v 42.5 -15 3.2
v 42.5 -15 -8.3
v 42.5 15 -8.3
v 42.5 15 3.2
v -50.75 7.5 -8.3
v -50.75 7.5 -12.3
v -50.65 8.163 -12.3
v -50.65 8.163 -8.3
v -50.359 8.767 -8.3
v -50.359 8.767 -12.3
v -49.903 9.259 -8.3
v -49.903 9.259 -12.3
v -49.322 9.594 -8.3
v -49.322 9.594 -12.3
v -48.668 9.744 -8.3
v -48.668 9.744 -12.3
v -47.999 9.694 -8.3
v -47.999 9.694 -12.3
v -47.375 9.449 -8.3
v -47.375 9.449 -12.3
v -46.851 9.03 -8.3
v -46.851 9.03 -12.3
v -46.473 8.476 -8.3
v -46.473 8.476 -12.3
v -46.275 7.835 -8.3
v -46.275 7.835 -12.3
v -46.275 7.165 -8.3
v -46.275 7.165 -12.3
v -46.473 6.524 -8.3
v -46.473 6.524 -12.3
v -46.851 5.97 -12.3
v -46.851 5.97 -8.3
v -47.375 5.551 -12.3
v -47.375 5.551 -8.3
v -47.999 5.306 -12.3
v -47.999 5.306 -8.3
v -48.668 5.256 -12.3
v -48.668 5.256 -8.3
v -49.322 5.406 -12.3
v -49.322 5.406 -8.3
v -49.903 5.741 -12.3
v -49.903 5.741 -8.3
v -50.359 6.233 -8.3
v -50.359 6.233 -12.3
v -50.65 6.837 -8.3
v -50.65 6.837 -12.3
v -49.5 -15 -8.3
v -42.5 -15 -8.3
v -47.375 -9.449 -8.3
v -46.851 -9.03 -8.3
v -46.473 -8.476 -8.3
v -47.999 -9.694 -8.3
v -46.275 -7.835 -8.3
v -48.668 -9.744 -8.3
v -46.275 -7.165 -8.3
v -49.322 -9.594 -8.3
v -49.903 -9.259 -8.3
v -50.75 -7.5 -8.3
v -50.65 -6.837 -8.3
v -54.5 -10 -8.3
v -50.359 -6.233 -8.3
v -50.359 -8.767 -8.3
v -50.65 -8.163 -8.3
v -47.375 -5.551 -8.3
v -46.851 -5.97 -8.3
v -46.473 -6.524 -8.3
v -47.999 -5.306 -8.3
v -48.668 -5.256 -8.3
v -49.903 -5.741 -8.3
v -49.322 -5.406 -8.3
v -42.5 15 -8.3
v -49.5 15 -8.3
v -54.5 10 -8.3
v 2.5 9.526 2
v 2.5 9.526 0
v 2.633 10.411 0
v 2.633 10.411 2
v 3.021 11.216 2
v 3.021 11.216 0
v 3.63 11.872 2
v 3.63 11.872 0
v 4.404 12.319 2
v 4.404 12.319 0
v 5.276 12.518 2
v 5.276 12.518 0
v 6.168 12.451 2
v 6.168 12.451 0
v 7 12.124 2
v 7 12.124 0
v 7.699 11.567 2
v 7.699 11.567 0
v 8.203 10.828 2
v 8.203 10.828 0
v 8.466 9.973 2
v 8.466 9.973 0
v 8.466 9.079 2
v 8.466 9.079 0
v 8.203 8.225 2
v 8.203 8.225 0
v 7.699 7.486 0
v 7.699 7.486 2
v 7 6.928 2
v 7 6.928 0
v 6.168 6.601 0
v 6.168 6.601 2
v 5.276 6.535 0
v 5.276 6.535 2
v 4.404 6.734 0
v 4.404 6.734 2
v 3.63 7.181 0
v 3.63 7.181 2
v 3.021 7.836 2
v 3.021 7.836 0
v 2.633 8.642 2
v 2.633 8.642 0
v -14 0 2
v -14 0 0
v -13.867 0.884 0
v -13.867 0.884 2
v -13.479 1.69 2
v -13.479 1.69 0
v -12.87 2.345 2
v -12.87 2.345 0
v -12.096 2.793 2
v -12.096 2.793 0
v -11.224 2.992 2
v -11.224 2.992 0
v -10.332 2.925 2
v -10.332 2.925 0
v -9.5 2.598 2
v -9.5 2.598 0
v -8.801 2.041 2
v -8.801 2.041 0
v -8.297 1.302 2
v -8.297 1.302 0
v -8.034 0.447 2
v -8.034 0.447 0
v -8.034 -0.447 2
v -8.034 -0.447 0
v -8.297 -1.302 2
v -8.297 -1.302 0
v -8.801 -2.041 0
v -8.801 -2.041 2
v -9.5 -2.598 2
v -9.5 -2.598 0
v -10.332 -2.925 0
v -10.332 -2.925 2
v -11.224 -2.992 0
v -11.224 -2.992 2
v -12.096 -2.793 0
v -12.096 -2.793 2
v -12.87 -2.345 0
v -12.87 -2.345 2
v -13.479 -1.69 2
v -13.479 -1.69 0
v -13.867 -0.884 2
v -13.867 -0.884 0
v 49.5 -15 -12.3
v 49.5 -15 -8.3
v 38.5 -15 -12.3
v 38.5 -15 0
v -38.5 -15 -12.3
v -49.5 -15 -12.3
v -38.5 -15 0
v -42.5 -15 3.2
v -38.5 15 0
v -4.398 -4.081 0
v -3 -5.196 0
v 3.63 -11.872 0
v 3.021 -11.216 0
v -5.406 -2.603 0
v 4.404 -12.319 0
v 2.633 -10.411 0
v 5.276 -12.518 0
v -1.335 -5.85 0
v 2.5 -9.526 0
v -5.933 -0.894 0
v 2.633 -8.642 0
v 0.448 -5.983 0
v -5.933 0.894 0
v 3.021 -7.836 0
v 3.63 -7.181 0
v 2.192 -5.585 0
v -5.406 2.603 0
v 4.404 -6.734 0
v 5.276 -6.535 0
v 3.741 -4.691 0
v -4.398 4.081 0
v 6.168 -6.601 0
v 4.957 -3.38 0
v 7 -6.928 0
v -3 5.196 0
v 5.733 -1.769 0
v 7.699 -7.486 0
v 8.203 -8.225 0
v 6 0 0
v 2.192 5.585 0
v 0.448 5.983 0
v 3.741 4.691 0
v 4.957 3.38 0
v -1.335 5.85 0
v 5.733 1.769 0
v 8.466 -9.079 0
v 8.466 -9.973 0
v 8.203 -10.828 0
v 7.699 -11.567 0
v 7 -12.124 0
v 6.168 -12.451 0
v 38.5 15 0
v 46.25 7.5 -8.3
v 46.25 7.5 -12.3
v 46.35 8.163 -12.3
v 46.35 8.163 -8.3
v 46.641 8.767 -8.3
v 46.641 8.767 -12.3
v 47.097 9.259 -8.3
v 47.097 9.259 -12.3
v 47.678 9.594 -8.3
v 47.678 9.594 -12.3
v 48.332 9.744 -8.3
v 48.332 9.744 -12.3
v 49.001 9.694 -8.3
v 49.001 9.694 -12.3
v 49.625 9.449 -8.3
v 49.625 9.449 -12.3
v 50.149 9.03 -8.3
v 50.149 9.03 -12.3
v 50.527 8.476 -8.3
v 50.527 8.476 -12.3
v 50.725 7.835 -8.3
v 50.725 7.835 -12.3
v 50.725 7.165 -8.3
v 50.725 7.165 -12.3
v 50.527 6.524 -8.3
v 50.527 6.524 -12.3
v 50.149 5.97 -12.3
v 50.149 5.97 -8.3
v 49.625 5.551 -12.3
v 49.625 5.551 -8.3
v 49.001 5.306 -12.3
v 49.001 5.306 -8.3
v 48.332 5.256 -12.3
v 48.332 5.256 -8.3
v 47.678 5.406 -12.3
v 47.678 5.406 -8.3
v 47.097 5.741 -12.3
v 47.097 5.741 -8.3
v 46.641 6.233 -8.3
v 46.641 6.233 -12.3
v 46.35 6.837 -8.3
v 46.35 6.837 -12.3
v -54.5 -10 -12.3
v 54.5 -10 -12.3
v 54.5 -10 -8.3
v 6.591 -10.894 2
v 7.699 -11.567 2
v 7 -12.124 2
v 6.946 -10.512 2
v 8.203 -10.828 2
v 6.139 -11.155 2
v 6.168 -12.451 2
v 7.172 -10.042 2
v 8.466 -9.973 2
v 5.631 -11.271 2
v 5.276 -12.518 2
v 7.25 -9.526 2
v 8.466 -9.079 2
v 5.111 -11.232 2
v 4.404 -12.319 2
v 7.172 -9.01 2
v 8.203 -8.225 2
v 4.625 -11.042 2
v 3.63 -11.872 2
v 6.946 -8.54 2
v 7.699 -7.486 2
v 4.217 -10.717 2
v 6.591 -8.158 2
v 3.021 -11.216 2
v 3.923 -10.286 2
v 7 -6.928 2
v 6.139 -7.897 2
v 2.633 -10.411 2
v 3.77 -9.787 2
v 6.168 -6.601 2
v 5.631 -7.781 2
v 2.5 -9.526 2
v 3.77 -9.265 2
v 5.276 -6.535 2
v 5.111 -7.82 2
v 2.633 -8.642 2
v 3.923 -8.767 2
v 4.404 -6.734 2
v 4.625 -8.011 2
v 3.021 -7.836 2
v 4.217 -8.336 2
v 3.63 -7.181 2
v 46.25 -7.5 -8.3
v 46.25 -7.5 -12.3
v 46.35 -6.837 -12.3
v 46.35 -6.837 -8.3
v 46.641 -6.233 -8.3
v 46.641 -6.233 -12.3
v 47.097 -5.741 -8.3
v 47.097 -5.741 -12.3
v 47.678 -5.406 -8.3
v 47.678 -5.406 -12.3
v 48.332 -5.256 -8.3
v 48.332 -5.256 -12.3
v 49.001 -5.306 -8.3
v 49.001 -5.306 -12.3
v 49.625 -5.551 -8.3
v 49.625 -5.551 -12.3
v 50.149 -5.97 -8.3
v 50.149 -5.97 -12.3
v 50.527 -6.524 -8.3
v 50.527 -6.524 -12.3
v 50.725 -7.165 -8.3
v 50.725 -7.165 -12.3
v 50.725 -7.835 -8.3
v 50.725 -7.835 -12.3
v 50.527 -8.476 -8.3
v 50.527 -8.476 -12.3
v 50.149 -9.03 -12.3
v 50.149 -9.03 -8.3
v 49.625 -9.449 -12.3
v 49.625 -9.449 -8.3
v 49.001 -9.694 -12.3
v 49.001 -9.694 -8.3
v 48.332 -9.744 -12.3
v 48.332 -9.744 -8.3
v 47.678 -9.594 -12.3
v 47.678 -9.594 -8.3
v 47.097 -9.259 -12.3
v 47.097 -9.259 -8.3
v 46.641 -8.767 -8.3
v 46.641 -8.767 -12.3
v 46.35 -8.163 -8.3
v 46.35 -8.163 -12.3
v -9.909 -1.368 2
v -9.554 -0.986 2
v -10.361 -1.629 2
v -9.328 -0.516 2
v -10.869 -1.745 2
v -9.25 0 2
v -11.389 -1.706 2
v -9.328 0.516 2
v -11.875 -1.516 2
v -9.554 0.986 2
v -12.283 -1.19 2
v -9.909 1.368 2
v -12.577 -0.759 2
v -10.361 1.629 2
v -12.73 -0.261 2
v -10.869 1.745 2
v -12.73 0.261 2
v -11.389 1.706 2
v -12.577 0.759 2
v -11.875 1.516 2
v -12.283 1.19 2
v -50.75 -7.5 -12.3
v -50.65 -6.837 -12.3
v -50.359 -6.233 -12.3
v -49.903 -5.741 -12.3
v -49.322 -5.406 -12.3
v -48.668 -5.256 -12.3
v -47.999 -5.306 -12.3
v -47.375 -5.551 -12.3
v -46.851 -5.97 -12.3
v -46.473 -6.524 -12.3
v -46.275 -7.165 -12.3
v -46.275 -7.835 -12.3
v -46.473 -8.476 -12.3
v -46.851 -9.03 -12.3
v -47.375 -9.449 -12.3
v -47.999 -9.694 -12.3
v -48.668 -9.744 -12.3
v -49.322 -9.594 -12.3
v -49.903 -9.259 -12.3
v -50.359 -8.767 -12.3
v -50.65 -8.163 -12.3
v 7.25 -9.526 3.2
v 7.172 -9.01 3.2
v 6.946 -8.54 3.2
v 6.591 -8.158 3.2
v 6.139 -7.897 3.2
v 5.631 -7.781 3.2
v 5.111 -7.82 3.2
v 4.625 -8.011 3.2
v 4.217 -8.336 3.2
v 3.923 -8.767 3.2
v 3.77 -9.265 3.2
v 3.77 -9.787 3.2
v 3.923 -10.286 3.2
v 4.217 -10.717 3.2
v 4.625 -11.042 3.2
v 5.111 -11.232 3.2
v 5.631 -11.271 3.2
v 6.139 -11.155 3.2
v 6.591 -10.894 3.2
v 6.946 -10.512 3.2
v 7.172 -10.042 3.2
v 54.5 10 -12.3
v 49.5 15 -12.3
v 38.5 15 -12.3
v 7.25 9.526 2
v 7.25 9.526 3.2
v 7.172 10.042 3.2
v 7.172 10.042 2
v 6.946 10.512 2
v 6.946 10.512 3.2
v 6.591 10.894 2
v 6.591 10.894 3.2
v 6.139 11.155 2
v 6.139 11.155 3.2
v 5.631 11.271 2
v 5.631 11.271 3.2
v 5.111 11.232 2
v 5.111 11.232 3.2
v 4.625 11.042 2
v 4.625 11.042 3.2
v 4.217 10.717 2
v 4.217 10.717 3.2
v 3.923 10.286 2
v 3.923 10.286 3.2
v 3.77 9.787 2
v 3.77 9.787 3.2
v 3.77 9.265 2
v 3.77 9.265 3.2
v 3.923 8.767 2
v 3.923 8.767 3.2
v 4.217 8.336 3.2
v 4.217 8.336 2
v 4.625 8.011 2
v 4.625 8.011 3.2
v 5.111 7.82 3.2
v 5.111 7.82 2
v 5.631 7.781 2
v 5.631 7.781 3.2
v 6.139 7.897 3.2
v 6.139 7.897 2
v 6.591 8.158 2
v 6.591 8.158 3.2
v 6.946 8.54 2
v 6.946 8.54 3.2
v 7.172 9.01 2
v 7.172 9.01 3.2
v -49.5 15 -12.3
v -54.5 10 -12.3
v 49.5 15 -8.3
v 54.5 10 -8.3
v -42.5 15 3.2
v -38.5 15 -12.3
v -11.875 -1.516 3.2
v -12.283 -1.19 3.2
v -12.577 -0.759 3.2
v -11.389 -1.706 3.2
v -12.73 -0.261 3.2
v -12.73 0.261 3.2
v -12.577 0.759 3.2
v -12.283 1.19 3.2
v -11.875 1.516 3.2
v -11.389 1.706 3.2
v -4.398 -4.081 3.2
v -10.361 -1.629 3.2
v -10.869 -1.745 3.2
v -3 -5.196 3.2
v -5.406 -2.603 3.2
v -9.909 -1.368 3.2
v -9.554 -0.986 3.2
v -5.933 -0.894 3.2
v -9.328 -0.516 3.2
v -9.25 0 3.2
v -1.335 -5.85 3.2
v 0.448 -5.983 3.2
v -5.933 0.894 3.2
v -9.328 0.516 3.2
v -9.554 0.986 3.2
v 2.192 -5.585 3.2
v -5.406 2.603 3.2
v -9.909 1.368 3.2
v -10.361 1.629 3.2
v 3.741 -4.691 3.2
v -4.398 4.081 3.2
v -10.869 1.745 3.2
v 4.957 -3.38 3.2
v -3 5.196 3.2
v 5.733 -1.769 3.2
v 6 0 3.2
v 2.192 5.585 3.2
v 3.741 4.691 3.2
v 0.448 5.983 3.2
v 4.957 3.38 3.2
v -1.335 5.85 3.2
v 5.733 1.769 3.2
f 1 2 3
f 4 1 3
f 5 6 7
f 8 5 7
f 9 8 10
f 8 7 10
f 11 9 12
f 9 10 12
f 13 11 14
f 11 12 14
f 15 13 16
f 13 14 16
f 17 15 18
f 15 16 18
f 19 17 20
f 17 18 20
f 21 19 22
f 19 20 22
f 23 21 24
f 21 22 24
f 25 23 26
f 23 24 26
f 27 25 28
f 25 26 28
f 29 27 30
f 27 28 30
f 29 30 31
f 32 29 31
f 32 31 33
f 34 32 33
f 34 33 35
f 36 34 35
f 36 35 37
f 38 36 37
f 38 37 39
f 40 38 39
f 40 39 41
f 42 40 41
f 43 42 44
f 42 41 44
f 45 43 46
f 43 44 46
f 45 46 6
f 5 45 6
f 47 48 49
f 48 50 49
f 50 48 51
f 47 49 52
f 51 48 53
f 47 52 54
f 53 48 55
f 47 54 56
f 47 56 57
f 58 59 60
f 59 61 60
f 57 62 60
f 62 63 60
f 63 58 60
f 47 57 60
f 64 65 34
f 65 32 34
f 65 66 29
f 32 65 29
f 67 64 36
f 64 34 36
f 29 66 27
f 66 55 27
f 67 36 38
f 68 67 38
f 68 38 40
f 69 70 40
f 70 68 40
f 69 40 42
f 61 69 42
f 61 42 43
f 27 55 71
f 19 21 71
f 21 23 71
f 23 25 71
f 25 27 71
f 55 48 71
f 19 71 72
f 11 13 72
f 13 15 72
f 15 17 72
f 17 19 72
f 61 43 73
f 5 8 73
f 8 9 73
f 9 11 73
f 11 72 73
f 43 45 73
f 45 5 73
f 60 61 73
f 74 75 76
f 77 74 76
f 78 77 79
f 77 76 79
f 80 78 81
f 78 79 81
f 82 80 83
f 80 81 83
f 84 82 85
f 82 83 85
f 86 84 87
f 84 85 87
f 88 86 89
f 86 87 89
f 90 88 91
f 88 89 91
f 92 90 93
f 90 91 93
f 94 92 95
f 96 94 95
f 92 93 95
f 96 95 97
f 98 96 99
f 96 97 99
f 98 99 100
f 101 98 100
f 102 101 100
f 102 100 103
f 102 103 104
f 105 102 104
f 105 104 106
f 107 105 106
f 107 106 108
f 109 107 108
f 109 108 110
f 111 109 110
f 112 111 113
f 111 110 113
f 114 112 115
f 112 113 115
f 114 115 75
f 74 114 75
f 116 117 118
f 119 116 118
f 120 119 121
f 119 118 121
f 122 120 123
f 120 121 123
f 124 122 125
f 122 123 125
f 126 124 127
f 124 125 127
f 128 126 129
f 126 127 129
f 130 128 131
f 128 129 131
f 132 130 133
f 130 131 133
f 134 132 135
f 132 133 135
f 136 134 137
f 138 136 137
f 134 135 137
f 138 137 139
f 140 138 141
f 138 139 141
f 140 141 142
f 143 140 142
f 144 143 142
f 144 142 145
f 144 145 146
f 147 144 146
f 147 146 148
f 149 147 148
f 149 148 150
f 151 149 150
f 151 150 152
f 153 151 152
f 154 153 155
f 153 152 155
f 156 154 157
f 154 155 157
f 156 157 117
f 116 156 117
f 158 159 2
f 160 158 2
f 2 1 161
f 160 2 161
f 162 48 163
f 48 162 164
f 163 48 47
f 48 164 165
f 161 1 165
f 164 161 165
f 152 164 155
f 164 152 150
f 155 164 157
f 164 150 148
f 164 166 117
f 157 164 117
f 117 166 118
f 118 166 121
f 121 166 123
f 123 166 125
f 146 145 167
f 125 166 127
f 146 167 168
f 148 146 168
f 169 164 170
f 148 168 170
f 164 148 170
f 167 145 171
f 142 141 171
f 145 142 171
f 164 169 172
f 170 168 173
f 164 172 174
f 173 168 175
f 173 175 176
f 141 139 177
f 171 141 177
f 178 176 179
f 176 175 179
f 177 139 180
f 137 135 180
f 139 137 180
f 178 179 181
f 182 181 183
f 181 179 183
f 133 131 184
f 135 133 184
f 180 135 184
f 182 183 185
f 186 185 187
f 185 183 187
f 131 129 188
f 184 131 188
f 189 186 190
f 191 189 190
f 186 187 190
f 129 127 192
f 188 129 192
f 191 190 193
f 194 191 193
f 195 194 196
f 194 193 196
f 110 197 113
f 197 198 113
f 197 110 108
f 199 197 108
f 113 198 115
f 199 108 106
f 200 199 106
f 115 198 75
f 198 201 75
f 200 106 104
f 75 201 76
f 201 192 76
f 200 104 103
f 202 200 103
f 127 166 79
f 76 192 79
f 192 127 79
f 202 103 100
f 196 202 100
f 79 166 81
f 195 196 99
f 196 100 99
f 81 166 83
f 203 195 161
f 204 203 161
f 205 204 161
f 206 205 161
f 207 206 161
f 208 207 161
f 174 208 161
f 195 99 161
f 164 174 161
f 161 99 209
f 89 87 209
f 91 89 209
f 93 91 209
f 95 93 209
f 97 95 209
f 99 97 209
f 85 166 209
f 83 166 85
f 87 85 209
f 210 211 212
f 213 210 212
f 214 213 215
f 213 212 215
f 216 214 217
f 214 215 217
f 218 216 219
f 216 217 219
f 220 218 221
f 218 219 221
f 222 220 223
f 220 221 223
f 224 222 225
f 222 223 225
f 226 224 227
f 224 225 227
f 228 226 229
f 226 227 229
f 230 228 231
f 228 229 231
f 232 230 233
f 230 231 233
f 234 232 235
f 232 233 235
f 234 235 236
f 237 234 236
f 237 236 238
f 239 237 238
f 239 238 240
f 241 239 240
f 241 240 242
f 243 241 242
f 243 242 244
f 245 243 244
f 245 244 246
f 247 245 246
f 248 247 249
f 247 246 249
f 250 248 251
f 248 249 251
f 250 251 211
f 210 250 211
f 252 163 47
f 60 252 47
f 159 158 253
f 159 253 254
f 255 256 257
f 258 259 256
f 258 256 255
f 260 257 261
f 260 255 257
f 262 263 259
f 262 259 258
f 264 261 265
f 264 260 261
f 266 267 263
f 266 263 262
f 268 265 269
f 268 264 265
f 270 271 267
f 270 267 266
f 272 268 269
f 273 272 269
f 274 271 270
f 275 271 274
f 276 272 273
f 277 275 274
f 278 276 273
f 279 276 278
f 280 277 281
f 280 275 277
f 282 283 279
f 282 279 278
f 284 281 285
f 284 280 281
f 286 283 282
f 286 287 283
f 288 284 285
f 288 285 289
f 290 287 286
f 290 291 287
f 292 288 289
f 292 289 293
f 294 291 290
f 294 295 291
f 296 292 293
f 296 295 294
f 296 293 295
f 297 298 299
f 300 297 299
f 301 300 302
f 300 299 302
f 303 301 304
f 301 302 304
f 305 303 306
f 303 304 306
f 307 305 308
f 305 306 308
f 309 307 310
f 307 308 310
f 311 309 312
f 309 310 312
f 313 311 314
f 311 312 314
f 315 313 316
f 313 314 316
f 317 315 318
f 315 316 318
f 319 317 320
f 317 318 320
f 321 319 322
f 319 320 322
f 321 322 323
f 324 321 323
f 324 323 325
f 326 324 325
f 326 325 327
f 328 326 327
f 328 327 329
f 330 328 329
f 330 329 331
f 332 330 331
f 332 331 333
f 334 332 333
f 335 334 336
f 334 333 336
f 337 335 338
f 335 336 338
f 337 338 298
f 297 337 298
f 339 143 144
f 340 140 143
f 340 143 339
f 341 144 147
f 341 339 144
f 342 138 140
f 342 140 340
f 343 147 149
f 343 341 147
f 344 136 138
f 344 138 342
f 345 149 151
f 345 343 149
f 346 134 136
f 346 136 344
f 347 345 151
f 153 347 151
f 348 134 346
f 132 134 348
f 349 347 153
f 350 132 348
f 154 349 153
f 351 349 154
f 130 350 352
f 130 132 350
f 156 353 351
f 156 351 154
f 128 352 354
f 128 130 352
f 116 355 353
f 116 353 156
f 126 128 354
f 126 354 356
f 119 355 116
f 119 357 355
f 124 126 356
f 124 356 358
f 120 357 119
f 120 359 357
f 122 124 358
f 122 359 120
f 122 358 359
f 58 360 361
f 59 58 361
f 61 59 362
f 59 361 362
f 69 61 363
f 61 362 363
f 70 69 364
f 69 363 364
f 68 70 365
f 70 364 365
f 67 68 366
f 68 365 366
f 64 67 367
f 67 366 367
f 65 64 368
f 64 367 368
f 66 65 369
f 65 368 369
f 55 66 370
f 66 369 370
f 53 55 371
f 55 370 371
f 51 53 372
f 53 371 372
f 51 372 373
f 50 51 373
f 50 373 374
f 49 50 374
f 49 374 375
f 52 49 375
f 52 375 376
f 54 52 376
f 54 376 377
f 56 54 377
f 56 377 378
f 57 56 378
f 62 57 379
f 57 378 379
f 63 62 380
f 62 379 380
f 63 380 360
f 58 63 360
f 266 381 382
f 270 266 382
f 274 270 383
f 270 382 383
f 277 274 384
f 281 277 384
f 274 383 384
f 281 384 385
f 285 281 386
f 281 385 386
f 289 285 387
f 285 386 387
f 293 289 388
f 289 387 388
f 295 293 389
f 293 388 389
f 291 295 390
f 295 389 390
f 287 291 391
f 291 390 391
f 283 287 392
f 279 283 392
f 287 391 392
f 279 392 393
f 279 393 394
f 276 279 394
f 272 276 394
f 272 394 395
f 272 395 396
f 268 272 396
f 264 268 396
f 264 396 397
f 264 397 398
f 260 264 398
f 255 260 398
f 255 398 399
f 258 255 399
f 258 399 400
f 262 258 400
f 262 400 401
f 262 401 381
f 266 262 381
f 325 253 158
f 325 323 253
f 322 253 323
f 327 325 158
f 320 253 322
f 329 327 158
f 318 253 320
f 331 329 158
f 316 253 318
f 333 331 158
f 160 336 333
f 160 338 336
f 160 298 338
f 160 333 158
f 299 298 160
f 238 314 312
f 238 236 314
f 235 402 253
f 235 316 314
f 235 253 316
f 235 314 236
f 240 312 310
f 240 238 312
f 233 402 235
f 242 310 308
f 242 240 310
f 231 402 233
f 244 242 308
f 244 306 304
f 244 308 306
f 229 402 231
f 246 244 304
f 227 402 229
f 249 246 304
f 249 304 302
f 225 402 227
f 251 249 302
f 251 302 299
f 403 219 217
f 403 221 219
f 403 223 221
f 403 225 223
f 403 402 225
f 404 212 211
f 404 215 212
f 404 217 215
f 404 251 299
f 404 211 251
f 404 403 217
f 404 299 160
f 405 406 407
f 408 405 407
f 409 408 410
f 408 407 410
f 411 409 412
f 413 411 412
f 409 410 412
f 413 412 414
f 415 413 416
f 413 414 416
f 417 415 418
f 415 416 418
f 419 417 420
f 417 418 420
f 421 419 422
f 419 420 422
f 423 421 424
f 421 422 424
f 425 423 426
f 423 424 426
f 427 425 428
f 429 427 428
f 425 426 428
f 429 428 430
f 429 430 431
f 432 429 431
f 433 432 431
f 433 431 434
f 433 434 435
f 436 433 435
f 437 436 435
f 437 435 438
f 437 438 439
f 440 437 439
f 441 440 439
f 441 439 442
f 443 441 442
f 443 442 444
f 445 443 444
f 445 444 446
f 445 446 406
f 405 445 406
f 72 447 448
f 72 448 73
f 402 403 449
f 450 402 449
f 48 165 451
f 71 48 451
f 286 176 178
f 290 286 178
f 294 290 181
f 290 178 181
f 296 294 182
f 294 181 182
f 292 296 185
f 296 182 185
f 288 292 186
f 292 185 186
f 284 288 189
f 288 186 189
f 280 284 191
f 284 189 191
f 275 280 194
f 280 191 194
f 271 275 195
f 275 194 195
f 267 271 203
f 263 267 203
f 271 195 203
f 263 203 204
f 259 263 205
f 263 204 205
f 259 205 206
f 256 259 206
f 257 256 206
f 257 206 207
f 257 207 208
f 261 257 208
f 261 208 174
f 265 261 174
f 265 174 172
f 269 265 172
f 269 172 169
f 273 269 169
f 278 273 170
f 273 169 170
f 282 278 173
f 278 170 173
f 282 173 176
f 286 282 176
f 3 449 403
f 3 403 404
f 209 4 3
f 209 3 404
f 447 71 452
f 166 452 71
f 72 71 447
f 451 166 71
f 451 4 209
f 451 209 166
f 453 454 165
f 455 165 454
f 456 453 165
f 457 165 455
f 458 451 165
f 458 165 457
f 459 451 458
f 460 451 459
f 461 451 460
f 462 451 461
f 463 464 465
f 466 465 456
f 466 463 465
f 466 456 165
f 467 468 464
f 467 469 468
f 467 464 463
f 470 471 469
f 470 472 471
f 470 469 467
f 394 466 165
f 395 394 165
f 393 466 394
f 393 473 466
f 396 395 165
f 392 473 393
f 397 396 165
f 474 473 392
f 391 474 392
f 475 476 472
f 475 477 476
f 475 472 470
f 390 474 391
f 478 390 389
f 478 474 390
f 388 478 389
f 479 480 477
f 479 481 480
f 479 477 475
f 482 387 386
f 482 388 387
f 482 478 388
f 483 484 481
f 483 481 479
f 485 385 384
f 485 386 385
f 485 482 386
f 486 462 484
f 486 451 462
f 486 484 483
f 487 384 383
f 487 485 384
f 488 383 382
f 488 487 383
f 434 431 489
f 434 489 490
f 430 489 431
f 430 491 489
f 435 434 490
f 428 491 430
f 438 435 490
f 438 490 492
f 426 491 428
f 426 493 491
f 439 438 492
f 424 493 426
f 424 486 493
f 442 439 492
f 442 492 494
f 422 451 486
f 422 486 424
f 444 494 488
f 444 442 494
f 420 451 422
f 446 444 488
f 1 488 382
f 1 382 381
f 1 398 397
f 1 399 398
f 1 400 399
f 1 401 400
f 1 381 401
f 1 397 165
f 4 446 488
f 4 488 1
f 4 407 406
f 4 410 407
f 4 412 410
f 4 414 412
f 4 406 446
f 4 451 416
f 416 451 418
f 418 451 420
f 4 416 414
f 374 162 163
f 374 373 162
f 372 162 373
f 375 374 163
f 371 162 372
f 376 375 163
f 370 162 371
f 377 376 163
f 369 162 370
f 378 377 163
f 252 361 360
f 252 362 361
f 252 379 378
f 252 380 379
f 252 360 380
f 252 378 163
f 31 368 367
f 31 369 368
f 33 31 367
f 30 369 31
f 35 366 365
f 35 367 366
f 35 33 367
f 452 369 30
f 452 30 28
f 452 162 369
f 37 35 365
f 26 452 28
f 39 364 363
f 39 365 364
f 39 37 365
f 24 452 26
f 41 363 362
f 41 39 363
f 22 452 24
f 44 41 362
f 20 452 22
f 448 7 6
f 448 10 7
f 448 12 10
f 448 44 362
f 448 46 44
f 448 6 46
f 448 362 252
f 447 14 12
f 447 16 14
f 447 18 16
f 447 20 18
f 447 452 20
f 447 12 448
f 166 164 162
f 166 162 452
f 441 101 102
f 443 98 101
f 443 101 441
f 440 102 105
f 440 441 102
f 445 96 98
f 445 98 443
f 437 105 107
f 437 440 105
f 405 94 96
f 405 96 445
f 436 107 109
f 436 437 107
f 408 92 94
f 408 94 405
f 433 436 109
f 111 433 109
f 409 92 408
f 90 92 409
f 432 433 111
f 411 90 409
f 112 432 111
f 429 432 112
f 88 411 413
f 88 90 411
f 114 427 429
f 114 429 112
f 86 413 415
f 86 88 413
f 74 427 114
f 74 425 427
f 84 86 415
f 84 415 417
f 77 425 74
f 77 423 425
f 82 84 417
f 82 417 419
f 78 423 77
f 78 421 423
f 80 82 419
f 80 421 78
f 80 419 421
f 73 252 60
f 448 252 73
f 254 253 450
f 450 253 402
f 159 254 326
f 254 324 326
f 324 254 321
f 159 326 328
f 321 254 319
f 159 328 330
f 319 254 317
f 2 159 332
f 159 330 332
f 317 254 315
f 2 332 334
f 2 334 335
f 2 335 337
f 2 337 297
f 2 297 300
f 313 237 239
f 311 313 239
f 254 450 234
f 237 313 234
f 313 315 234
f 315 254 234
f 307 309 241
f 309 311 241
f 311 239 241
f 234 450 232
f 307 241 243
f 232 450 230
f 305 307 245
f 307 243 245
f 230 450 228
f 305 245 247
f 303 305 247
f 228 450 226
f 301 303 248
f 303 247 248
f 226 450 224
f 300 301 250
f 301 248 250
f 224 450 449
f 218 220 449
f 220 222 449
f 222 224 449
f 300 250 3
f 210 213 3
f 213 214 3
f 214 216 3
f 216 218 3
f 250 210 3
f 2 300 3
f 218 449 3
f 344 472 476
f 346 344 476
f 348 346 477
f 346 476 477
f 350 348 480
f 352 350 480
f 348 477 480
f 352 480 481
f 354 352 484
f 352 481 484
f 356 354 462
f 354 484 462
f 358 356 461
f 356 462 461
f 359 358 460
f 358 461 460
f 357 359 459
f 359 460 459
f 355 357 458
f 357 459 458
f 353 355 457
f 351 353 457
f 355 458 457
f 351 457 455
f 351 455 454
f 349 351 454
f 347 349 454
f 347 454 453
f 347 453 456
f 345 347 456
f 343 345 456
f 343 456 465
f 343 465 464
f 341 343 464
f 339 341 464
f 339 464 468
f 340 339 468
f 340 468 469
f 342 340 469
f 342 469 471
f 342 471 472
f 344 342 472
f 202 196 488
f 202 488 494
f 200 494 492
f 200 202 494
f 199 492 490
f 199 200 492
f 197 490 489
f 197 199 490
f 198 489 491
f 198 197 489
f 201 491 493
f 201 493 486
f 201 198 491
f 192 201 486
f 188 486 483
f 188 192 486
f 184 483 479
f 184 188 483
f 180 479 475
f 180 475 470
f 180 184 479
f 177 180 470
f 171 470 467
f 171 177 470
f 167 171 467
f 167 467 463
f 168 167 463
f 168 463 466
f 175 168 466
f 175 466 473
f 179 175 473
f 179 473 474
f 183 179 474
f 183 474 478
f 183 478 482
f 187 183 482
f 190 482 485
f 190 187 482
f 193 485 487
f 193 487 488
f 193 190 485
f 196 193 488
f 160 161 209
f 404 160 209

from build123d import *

# Parameters (mm, degrees)
SKETCH1_W           = 85
SKETCH1_H           = 30
SKETCH1_R           = 6
BOSS_EXTRUDE1_DEPTH = 3.2
SKETCH5_R           = 1.75
CUT_EXTRUDE1_DEPTH  = 4.2
SKETCH7_R           = 3
CUT_EXTRUDE2_DEPTH  = 2
SKETCH2_W           = 4
SKETCH2_H           = 30
BOSS_EXTRUDE2_DEPTH = 12.3
SKETCH3_W           = 16
SKETCH3_H           = 30
SKETCH3_R           = 2.25
BOSS_EXTRUDE3_DEPTH = 4
CHAMFER1_SIZE       = 5


with BuildPart() as part:
    # Sketch1 → Boss-Extrude1 (new body)
    with BuildSketch(Plane.XY):
        Rectangle(SKETCH1_W, SKETCH1_H)
        Circle(SKETCH1_R, mode=Mode.SUBTRACT)
    extrude(amount=BOSS_EXTRUDE1_DEPTH)

    # Sketch5 → Cut-Extrude1 (cut, through all)
    with BuildSketch(Plane.XY.offset(3.2)):
        with Locations((5.5, 9.526279442)):
            Circle(SKETCH5_R)
        with Locations((-11, 0)):
            Circle(SKETCH5_R)
        with Locations((5.5, -9.526279442)):
            Circle(SKETCH5_R)
    extrude(amount=-CUT_EXTRUDE1_DEPTH, mode=Mode.SUBTRACT)

    # Sketch7 → Cut-Extrude2 (cut)
    with BuildSketch(Plane(origin=(0, 0, 0), x_dir=(-1, 0, 0), z_dir=(0, 0, -1))):
        with Locations((-5.5, 9.526279442)):
            Circle(SKETCH7_R)
        with Locations((11, 0)):
            Circle(SKETCH7_R)
        with Locations((-5.5, -9.526279442)):
            Circle(SKETCH7_R)
    extrude(amount=-CUT_EXTRUDE2_DEPTH, mode=Mode.SUBTRACT)

    # Sketch2 → Boss-Extrude2 (add)
    with BuildSketch(Plane(origin=(0, 0, 0), x_dir=(-1, 0, 0), z_dir=(0, 0, -1))):
        with Locations((40.5, 0)):
            Rectangle(SKETCH2_W, SKETCH2_H)
        with Locations((-40.5, 0)):
            Rectangle(SKETCH2_W, SKETCH2_H)
    extrude(amount=BOSS_EXTRUDE2_DEPTH)

    # Sketch3 → Boss-Extrude3 (add)
    with BuildSketch(Plane(origin=(0, 0, -12.3), x_dir=(-1, 0, 0), z_dir=(0, 0, -1))):
        with Locations((46.5, 0)):
            Rectangle(SKETCH3_W, SKETCH3_H)
        with Locations((48.5, -7.5)):
            Circle(SKETCH3_R, mode=Mode.SUBTRACT)
        with Locations((48.5, 7.5)):
            Circle(SKETCH3_R, mode=Mode.SUBTRACT)
        with Locations((-46.5, 0)):
            Rectangle(SKETCH3_W, SKETCH3_H)
        with Locations((-48.5, 7.5)):
            Circle(SKETCH3_R, mode=Mode.SUBTRACT)
        with Locations((-48.5, -7.5)):
            Circle(SKETCH3_R, mode=Mode.SUBTRACT)
    extrude(amount=-BOSS_EXTRUDE3_DEPTH)

    # Chamfer1
    chamfer1_edges = [part.edges().sort_by_distance(p)[0] for p in [
        (54.5, 15, -10.3),
        (54.5, -15, -10.3),
        (-54.5, -15, -10.3),
        (-54.5, 15, -10.3),
    ]]
    chamfer(chamfer1_edges, length=CHAMFER1_SIZE)


solid = part.part
